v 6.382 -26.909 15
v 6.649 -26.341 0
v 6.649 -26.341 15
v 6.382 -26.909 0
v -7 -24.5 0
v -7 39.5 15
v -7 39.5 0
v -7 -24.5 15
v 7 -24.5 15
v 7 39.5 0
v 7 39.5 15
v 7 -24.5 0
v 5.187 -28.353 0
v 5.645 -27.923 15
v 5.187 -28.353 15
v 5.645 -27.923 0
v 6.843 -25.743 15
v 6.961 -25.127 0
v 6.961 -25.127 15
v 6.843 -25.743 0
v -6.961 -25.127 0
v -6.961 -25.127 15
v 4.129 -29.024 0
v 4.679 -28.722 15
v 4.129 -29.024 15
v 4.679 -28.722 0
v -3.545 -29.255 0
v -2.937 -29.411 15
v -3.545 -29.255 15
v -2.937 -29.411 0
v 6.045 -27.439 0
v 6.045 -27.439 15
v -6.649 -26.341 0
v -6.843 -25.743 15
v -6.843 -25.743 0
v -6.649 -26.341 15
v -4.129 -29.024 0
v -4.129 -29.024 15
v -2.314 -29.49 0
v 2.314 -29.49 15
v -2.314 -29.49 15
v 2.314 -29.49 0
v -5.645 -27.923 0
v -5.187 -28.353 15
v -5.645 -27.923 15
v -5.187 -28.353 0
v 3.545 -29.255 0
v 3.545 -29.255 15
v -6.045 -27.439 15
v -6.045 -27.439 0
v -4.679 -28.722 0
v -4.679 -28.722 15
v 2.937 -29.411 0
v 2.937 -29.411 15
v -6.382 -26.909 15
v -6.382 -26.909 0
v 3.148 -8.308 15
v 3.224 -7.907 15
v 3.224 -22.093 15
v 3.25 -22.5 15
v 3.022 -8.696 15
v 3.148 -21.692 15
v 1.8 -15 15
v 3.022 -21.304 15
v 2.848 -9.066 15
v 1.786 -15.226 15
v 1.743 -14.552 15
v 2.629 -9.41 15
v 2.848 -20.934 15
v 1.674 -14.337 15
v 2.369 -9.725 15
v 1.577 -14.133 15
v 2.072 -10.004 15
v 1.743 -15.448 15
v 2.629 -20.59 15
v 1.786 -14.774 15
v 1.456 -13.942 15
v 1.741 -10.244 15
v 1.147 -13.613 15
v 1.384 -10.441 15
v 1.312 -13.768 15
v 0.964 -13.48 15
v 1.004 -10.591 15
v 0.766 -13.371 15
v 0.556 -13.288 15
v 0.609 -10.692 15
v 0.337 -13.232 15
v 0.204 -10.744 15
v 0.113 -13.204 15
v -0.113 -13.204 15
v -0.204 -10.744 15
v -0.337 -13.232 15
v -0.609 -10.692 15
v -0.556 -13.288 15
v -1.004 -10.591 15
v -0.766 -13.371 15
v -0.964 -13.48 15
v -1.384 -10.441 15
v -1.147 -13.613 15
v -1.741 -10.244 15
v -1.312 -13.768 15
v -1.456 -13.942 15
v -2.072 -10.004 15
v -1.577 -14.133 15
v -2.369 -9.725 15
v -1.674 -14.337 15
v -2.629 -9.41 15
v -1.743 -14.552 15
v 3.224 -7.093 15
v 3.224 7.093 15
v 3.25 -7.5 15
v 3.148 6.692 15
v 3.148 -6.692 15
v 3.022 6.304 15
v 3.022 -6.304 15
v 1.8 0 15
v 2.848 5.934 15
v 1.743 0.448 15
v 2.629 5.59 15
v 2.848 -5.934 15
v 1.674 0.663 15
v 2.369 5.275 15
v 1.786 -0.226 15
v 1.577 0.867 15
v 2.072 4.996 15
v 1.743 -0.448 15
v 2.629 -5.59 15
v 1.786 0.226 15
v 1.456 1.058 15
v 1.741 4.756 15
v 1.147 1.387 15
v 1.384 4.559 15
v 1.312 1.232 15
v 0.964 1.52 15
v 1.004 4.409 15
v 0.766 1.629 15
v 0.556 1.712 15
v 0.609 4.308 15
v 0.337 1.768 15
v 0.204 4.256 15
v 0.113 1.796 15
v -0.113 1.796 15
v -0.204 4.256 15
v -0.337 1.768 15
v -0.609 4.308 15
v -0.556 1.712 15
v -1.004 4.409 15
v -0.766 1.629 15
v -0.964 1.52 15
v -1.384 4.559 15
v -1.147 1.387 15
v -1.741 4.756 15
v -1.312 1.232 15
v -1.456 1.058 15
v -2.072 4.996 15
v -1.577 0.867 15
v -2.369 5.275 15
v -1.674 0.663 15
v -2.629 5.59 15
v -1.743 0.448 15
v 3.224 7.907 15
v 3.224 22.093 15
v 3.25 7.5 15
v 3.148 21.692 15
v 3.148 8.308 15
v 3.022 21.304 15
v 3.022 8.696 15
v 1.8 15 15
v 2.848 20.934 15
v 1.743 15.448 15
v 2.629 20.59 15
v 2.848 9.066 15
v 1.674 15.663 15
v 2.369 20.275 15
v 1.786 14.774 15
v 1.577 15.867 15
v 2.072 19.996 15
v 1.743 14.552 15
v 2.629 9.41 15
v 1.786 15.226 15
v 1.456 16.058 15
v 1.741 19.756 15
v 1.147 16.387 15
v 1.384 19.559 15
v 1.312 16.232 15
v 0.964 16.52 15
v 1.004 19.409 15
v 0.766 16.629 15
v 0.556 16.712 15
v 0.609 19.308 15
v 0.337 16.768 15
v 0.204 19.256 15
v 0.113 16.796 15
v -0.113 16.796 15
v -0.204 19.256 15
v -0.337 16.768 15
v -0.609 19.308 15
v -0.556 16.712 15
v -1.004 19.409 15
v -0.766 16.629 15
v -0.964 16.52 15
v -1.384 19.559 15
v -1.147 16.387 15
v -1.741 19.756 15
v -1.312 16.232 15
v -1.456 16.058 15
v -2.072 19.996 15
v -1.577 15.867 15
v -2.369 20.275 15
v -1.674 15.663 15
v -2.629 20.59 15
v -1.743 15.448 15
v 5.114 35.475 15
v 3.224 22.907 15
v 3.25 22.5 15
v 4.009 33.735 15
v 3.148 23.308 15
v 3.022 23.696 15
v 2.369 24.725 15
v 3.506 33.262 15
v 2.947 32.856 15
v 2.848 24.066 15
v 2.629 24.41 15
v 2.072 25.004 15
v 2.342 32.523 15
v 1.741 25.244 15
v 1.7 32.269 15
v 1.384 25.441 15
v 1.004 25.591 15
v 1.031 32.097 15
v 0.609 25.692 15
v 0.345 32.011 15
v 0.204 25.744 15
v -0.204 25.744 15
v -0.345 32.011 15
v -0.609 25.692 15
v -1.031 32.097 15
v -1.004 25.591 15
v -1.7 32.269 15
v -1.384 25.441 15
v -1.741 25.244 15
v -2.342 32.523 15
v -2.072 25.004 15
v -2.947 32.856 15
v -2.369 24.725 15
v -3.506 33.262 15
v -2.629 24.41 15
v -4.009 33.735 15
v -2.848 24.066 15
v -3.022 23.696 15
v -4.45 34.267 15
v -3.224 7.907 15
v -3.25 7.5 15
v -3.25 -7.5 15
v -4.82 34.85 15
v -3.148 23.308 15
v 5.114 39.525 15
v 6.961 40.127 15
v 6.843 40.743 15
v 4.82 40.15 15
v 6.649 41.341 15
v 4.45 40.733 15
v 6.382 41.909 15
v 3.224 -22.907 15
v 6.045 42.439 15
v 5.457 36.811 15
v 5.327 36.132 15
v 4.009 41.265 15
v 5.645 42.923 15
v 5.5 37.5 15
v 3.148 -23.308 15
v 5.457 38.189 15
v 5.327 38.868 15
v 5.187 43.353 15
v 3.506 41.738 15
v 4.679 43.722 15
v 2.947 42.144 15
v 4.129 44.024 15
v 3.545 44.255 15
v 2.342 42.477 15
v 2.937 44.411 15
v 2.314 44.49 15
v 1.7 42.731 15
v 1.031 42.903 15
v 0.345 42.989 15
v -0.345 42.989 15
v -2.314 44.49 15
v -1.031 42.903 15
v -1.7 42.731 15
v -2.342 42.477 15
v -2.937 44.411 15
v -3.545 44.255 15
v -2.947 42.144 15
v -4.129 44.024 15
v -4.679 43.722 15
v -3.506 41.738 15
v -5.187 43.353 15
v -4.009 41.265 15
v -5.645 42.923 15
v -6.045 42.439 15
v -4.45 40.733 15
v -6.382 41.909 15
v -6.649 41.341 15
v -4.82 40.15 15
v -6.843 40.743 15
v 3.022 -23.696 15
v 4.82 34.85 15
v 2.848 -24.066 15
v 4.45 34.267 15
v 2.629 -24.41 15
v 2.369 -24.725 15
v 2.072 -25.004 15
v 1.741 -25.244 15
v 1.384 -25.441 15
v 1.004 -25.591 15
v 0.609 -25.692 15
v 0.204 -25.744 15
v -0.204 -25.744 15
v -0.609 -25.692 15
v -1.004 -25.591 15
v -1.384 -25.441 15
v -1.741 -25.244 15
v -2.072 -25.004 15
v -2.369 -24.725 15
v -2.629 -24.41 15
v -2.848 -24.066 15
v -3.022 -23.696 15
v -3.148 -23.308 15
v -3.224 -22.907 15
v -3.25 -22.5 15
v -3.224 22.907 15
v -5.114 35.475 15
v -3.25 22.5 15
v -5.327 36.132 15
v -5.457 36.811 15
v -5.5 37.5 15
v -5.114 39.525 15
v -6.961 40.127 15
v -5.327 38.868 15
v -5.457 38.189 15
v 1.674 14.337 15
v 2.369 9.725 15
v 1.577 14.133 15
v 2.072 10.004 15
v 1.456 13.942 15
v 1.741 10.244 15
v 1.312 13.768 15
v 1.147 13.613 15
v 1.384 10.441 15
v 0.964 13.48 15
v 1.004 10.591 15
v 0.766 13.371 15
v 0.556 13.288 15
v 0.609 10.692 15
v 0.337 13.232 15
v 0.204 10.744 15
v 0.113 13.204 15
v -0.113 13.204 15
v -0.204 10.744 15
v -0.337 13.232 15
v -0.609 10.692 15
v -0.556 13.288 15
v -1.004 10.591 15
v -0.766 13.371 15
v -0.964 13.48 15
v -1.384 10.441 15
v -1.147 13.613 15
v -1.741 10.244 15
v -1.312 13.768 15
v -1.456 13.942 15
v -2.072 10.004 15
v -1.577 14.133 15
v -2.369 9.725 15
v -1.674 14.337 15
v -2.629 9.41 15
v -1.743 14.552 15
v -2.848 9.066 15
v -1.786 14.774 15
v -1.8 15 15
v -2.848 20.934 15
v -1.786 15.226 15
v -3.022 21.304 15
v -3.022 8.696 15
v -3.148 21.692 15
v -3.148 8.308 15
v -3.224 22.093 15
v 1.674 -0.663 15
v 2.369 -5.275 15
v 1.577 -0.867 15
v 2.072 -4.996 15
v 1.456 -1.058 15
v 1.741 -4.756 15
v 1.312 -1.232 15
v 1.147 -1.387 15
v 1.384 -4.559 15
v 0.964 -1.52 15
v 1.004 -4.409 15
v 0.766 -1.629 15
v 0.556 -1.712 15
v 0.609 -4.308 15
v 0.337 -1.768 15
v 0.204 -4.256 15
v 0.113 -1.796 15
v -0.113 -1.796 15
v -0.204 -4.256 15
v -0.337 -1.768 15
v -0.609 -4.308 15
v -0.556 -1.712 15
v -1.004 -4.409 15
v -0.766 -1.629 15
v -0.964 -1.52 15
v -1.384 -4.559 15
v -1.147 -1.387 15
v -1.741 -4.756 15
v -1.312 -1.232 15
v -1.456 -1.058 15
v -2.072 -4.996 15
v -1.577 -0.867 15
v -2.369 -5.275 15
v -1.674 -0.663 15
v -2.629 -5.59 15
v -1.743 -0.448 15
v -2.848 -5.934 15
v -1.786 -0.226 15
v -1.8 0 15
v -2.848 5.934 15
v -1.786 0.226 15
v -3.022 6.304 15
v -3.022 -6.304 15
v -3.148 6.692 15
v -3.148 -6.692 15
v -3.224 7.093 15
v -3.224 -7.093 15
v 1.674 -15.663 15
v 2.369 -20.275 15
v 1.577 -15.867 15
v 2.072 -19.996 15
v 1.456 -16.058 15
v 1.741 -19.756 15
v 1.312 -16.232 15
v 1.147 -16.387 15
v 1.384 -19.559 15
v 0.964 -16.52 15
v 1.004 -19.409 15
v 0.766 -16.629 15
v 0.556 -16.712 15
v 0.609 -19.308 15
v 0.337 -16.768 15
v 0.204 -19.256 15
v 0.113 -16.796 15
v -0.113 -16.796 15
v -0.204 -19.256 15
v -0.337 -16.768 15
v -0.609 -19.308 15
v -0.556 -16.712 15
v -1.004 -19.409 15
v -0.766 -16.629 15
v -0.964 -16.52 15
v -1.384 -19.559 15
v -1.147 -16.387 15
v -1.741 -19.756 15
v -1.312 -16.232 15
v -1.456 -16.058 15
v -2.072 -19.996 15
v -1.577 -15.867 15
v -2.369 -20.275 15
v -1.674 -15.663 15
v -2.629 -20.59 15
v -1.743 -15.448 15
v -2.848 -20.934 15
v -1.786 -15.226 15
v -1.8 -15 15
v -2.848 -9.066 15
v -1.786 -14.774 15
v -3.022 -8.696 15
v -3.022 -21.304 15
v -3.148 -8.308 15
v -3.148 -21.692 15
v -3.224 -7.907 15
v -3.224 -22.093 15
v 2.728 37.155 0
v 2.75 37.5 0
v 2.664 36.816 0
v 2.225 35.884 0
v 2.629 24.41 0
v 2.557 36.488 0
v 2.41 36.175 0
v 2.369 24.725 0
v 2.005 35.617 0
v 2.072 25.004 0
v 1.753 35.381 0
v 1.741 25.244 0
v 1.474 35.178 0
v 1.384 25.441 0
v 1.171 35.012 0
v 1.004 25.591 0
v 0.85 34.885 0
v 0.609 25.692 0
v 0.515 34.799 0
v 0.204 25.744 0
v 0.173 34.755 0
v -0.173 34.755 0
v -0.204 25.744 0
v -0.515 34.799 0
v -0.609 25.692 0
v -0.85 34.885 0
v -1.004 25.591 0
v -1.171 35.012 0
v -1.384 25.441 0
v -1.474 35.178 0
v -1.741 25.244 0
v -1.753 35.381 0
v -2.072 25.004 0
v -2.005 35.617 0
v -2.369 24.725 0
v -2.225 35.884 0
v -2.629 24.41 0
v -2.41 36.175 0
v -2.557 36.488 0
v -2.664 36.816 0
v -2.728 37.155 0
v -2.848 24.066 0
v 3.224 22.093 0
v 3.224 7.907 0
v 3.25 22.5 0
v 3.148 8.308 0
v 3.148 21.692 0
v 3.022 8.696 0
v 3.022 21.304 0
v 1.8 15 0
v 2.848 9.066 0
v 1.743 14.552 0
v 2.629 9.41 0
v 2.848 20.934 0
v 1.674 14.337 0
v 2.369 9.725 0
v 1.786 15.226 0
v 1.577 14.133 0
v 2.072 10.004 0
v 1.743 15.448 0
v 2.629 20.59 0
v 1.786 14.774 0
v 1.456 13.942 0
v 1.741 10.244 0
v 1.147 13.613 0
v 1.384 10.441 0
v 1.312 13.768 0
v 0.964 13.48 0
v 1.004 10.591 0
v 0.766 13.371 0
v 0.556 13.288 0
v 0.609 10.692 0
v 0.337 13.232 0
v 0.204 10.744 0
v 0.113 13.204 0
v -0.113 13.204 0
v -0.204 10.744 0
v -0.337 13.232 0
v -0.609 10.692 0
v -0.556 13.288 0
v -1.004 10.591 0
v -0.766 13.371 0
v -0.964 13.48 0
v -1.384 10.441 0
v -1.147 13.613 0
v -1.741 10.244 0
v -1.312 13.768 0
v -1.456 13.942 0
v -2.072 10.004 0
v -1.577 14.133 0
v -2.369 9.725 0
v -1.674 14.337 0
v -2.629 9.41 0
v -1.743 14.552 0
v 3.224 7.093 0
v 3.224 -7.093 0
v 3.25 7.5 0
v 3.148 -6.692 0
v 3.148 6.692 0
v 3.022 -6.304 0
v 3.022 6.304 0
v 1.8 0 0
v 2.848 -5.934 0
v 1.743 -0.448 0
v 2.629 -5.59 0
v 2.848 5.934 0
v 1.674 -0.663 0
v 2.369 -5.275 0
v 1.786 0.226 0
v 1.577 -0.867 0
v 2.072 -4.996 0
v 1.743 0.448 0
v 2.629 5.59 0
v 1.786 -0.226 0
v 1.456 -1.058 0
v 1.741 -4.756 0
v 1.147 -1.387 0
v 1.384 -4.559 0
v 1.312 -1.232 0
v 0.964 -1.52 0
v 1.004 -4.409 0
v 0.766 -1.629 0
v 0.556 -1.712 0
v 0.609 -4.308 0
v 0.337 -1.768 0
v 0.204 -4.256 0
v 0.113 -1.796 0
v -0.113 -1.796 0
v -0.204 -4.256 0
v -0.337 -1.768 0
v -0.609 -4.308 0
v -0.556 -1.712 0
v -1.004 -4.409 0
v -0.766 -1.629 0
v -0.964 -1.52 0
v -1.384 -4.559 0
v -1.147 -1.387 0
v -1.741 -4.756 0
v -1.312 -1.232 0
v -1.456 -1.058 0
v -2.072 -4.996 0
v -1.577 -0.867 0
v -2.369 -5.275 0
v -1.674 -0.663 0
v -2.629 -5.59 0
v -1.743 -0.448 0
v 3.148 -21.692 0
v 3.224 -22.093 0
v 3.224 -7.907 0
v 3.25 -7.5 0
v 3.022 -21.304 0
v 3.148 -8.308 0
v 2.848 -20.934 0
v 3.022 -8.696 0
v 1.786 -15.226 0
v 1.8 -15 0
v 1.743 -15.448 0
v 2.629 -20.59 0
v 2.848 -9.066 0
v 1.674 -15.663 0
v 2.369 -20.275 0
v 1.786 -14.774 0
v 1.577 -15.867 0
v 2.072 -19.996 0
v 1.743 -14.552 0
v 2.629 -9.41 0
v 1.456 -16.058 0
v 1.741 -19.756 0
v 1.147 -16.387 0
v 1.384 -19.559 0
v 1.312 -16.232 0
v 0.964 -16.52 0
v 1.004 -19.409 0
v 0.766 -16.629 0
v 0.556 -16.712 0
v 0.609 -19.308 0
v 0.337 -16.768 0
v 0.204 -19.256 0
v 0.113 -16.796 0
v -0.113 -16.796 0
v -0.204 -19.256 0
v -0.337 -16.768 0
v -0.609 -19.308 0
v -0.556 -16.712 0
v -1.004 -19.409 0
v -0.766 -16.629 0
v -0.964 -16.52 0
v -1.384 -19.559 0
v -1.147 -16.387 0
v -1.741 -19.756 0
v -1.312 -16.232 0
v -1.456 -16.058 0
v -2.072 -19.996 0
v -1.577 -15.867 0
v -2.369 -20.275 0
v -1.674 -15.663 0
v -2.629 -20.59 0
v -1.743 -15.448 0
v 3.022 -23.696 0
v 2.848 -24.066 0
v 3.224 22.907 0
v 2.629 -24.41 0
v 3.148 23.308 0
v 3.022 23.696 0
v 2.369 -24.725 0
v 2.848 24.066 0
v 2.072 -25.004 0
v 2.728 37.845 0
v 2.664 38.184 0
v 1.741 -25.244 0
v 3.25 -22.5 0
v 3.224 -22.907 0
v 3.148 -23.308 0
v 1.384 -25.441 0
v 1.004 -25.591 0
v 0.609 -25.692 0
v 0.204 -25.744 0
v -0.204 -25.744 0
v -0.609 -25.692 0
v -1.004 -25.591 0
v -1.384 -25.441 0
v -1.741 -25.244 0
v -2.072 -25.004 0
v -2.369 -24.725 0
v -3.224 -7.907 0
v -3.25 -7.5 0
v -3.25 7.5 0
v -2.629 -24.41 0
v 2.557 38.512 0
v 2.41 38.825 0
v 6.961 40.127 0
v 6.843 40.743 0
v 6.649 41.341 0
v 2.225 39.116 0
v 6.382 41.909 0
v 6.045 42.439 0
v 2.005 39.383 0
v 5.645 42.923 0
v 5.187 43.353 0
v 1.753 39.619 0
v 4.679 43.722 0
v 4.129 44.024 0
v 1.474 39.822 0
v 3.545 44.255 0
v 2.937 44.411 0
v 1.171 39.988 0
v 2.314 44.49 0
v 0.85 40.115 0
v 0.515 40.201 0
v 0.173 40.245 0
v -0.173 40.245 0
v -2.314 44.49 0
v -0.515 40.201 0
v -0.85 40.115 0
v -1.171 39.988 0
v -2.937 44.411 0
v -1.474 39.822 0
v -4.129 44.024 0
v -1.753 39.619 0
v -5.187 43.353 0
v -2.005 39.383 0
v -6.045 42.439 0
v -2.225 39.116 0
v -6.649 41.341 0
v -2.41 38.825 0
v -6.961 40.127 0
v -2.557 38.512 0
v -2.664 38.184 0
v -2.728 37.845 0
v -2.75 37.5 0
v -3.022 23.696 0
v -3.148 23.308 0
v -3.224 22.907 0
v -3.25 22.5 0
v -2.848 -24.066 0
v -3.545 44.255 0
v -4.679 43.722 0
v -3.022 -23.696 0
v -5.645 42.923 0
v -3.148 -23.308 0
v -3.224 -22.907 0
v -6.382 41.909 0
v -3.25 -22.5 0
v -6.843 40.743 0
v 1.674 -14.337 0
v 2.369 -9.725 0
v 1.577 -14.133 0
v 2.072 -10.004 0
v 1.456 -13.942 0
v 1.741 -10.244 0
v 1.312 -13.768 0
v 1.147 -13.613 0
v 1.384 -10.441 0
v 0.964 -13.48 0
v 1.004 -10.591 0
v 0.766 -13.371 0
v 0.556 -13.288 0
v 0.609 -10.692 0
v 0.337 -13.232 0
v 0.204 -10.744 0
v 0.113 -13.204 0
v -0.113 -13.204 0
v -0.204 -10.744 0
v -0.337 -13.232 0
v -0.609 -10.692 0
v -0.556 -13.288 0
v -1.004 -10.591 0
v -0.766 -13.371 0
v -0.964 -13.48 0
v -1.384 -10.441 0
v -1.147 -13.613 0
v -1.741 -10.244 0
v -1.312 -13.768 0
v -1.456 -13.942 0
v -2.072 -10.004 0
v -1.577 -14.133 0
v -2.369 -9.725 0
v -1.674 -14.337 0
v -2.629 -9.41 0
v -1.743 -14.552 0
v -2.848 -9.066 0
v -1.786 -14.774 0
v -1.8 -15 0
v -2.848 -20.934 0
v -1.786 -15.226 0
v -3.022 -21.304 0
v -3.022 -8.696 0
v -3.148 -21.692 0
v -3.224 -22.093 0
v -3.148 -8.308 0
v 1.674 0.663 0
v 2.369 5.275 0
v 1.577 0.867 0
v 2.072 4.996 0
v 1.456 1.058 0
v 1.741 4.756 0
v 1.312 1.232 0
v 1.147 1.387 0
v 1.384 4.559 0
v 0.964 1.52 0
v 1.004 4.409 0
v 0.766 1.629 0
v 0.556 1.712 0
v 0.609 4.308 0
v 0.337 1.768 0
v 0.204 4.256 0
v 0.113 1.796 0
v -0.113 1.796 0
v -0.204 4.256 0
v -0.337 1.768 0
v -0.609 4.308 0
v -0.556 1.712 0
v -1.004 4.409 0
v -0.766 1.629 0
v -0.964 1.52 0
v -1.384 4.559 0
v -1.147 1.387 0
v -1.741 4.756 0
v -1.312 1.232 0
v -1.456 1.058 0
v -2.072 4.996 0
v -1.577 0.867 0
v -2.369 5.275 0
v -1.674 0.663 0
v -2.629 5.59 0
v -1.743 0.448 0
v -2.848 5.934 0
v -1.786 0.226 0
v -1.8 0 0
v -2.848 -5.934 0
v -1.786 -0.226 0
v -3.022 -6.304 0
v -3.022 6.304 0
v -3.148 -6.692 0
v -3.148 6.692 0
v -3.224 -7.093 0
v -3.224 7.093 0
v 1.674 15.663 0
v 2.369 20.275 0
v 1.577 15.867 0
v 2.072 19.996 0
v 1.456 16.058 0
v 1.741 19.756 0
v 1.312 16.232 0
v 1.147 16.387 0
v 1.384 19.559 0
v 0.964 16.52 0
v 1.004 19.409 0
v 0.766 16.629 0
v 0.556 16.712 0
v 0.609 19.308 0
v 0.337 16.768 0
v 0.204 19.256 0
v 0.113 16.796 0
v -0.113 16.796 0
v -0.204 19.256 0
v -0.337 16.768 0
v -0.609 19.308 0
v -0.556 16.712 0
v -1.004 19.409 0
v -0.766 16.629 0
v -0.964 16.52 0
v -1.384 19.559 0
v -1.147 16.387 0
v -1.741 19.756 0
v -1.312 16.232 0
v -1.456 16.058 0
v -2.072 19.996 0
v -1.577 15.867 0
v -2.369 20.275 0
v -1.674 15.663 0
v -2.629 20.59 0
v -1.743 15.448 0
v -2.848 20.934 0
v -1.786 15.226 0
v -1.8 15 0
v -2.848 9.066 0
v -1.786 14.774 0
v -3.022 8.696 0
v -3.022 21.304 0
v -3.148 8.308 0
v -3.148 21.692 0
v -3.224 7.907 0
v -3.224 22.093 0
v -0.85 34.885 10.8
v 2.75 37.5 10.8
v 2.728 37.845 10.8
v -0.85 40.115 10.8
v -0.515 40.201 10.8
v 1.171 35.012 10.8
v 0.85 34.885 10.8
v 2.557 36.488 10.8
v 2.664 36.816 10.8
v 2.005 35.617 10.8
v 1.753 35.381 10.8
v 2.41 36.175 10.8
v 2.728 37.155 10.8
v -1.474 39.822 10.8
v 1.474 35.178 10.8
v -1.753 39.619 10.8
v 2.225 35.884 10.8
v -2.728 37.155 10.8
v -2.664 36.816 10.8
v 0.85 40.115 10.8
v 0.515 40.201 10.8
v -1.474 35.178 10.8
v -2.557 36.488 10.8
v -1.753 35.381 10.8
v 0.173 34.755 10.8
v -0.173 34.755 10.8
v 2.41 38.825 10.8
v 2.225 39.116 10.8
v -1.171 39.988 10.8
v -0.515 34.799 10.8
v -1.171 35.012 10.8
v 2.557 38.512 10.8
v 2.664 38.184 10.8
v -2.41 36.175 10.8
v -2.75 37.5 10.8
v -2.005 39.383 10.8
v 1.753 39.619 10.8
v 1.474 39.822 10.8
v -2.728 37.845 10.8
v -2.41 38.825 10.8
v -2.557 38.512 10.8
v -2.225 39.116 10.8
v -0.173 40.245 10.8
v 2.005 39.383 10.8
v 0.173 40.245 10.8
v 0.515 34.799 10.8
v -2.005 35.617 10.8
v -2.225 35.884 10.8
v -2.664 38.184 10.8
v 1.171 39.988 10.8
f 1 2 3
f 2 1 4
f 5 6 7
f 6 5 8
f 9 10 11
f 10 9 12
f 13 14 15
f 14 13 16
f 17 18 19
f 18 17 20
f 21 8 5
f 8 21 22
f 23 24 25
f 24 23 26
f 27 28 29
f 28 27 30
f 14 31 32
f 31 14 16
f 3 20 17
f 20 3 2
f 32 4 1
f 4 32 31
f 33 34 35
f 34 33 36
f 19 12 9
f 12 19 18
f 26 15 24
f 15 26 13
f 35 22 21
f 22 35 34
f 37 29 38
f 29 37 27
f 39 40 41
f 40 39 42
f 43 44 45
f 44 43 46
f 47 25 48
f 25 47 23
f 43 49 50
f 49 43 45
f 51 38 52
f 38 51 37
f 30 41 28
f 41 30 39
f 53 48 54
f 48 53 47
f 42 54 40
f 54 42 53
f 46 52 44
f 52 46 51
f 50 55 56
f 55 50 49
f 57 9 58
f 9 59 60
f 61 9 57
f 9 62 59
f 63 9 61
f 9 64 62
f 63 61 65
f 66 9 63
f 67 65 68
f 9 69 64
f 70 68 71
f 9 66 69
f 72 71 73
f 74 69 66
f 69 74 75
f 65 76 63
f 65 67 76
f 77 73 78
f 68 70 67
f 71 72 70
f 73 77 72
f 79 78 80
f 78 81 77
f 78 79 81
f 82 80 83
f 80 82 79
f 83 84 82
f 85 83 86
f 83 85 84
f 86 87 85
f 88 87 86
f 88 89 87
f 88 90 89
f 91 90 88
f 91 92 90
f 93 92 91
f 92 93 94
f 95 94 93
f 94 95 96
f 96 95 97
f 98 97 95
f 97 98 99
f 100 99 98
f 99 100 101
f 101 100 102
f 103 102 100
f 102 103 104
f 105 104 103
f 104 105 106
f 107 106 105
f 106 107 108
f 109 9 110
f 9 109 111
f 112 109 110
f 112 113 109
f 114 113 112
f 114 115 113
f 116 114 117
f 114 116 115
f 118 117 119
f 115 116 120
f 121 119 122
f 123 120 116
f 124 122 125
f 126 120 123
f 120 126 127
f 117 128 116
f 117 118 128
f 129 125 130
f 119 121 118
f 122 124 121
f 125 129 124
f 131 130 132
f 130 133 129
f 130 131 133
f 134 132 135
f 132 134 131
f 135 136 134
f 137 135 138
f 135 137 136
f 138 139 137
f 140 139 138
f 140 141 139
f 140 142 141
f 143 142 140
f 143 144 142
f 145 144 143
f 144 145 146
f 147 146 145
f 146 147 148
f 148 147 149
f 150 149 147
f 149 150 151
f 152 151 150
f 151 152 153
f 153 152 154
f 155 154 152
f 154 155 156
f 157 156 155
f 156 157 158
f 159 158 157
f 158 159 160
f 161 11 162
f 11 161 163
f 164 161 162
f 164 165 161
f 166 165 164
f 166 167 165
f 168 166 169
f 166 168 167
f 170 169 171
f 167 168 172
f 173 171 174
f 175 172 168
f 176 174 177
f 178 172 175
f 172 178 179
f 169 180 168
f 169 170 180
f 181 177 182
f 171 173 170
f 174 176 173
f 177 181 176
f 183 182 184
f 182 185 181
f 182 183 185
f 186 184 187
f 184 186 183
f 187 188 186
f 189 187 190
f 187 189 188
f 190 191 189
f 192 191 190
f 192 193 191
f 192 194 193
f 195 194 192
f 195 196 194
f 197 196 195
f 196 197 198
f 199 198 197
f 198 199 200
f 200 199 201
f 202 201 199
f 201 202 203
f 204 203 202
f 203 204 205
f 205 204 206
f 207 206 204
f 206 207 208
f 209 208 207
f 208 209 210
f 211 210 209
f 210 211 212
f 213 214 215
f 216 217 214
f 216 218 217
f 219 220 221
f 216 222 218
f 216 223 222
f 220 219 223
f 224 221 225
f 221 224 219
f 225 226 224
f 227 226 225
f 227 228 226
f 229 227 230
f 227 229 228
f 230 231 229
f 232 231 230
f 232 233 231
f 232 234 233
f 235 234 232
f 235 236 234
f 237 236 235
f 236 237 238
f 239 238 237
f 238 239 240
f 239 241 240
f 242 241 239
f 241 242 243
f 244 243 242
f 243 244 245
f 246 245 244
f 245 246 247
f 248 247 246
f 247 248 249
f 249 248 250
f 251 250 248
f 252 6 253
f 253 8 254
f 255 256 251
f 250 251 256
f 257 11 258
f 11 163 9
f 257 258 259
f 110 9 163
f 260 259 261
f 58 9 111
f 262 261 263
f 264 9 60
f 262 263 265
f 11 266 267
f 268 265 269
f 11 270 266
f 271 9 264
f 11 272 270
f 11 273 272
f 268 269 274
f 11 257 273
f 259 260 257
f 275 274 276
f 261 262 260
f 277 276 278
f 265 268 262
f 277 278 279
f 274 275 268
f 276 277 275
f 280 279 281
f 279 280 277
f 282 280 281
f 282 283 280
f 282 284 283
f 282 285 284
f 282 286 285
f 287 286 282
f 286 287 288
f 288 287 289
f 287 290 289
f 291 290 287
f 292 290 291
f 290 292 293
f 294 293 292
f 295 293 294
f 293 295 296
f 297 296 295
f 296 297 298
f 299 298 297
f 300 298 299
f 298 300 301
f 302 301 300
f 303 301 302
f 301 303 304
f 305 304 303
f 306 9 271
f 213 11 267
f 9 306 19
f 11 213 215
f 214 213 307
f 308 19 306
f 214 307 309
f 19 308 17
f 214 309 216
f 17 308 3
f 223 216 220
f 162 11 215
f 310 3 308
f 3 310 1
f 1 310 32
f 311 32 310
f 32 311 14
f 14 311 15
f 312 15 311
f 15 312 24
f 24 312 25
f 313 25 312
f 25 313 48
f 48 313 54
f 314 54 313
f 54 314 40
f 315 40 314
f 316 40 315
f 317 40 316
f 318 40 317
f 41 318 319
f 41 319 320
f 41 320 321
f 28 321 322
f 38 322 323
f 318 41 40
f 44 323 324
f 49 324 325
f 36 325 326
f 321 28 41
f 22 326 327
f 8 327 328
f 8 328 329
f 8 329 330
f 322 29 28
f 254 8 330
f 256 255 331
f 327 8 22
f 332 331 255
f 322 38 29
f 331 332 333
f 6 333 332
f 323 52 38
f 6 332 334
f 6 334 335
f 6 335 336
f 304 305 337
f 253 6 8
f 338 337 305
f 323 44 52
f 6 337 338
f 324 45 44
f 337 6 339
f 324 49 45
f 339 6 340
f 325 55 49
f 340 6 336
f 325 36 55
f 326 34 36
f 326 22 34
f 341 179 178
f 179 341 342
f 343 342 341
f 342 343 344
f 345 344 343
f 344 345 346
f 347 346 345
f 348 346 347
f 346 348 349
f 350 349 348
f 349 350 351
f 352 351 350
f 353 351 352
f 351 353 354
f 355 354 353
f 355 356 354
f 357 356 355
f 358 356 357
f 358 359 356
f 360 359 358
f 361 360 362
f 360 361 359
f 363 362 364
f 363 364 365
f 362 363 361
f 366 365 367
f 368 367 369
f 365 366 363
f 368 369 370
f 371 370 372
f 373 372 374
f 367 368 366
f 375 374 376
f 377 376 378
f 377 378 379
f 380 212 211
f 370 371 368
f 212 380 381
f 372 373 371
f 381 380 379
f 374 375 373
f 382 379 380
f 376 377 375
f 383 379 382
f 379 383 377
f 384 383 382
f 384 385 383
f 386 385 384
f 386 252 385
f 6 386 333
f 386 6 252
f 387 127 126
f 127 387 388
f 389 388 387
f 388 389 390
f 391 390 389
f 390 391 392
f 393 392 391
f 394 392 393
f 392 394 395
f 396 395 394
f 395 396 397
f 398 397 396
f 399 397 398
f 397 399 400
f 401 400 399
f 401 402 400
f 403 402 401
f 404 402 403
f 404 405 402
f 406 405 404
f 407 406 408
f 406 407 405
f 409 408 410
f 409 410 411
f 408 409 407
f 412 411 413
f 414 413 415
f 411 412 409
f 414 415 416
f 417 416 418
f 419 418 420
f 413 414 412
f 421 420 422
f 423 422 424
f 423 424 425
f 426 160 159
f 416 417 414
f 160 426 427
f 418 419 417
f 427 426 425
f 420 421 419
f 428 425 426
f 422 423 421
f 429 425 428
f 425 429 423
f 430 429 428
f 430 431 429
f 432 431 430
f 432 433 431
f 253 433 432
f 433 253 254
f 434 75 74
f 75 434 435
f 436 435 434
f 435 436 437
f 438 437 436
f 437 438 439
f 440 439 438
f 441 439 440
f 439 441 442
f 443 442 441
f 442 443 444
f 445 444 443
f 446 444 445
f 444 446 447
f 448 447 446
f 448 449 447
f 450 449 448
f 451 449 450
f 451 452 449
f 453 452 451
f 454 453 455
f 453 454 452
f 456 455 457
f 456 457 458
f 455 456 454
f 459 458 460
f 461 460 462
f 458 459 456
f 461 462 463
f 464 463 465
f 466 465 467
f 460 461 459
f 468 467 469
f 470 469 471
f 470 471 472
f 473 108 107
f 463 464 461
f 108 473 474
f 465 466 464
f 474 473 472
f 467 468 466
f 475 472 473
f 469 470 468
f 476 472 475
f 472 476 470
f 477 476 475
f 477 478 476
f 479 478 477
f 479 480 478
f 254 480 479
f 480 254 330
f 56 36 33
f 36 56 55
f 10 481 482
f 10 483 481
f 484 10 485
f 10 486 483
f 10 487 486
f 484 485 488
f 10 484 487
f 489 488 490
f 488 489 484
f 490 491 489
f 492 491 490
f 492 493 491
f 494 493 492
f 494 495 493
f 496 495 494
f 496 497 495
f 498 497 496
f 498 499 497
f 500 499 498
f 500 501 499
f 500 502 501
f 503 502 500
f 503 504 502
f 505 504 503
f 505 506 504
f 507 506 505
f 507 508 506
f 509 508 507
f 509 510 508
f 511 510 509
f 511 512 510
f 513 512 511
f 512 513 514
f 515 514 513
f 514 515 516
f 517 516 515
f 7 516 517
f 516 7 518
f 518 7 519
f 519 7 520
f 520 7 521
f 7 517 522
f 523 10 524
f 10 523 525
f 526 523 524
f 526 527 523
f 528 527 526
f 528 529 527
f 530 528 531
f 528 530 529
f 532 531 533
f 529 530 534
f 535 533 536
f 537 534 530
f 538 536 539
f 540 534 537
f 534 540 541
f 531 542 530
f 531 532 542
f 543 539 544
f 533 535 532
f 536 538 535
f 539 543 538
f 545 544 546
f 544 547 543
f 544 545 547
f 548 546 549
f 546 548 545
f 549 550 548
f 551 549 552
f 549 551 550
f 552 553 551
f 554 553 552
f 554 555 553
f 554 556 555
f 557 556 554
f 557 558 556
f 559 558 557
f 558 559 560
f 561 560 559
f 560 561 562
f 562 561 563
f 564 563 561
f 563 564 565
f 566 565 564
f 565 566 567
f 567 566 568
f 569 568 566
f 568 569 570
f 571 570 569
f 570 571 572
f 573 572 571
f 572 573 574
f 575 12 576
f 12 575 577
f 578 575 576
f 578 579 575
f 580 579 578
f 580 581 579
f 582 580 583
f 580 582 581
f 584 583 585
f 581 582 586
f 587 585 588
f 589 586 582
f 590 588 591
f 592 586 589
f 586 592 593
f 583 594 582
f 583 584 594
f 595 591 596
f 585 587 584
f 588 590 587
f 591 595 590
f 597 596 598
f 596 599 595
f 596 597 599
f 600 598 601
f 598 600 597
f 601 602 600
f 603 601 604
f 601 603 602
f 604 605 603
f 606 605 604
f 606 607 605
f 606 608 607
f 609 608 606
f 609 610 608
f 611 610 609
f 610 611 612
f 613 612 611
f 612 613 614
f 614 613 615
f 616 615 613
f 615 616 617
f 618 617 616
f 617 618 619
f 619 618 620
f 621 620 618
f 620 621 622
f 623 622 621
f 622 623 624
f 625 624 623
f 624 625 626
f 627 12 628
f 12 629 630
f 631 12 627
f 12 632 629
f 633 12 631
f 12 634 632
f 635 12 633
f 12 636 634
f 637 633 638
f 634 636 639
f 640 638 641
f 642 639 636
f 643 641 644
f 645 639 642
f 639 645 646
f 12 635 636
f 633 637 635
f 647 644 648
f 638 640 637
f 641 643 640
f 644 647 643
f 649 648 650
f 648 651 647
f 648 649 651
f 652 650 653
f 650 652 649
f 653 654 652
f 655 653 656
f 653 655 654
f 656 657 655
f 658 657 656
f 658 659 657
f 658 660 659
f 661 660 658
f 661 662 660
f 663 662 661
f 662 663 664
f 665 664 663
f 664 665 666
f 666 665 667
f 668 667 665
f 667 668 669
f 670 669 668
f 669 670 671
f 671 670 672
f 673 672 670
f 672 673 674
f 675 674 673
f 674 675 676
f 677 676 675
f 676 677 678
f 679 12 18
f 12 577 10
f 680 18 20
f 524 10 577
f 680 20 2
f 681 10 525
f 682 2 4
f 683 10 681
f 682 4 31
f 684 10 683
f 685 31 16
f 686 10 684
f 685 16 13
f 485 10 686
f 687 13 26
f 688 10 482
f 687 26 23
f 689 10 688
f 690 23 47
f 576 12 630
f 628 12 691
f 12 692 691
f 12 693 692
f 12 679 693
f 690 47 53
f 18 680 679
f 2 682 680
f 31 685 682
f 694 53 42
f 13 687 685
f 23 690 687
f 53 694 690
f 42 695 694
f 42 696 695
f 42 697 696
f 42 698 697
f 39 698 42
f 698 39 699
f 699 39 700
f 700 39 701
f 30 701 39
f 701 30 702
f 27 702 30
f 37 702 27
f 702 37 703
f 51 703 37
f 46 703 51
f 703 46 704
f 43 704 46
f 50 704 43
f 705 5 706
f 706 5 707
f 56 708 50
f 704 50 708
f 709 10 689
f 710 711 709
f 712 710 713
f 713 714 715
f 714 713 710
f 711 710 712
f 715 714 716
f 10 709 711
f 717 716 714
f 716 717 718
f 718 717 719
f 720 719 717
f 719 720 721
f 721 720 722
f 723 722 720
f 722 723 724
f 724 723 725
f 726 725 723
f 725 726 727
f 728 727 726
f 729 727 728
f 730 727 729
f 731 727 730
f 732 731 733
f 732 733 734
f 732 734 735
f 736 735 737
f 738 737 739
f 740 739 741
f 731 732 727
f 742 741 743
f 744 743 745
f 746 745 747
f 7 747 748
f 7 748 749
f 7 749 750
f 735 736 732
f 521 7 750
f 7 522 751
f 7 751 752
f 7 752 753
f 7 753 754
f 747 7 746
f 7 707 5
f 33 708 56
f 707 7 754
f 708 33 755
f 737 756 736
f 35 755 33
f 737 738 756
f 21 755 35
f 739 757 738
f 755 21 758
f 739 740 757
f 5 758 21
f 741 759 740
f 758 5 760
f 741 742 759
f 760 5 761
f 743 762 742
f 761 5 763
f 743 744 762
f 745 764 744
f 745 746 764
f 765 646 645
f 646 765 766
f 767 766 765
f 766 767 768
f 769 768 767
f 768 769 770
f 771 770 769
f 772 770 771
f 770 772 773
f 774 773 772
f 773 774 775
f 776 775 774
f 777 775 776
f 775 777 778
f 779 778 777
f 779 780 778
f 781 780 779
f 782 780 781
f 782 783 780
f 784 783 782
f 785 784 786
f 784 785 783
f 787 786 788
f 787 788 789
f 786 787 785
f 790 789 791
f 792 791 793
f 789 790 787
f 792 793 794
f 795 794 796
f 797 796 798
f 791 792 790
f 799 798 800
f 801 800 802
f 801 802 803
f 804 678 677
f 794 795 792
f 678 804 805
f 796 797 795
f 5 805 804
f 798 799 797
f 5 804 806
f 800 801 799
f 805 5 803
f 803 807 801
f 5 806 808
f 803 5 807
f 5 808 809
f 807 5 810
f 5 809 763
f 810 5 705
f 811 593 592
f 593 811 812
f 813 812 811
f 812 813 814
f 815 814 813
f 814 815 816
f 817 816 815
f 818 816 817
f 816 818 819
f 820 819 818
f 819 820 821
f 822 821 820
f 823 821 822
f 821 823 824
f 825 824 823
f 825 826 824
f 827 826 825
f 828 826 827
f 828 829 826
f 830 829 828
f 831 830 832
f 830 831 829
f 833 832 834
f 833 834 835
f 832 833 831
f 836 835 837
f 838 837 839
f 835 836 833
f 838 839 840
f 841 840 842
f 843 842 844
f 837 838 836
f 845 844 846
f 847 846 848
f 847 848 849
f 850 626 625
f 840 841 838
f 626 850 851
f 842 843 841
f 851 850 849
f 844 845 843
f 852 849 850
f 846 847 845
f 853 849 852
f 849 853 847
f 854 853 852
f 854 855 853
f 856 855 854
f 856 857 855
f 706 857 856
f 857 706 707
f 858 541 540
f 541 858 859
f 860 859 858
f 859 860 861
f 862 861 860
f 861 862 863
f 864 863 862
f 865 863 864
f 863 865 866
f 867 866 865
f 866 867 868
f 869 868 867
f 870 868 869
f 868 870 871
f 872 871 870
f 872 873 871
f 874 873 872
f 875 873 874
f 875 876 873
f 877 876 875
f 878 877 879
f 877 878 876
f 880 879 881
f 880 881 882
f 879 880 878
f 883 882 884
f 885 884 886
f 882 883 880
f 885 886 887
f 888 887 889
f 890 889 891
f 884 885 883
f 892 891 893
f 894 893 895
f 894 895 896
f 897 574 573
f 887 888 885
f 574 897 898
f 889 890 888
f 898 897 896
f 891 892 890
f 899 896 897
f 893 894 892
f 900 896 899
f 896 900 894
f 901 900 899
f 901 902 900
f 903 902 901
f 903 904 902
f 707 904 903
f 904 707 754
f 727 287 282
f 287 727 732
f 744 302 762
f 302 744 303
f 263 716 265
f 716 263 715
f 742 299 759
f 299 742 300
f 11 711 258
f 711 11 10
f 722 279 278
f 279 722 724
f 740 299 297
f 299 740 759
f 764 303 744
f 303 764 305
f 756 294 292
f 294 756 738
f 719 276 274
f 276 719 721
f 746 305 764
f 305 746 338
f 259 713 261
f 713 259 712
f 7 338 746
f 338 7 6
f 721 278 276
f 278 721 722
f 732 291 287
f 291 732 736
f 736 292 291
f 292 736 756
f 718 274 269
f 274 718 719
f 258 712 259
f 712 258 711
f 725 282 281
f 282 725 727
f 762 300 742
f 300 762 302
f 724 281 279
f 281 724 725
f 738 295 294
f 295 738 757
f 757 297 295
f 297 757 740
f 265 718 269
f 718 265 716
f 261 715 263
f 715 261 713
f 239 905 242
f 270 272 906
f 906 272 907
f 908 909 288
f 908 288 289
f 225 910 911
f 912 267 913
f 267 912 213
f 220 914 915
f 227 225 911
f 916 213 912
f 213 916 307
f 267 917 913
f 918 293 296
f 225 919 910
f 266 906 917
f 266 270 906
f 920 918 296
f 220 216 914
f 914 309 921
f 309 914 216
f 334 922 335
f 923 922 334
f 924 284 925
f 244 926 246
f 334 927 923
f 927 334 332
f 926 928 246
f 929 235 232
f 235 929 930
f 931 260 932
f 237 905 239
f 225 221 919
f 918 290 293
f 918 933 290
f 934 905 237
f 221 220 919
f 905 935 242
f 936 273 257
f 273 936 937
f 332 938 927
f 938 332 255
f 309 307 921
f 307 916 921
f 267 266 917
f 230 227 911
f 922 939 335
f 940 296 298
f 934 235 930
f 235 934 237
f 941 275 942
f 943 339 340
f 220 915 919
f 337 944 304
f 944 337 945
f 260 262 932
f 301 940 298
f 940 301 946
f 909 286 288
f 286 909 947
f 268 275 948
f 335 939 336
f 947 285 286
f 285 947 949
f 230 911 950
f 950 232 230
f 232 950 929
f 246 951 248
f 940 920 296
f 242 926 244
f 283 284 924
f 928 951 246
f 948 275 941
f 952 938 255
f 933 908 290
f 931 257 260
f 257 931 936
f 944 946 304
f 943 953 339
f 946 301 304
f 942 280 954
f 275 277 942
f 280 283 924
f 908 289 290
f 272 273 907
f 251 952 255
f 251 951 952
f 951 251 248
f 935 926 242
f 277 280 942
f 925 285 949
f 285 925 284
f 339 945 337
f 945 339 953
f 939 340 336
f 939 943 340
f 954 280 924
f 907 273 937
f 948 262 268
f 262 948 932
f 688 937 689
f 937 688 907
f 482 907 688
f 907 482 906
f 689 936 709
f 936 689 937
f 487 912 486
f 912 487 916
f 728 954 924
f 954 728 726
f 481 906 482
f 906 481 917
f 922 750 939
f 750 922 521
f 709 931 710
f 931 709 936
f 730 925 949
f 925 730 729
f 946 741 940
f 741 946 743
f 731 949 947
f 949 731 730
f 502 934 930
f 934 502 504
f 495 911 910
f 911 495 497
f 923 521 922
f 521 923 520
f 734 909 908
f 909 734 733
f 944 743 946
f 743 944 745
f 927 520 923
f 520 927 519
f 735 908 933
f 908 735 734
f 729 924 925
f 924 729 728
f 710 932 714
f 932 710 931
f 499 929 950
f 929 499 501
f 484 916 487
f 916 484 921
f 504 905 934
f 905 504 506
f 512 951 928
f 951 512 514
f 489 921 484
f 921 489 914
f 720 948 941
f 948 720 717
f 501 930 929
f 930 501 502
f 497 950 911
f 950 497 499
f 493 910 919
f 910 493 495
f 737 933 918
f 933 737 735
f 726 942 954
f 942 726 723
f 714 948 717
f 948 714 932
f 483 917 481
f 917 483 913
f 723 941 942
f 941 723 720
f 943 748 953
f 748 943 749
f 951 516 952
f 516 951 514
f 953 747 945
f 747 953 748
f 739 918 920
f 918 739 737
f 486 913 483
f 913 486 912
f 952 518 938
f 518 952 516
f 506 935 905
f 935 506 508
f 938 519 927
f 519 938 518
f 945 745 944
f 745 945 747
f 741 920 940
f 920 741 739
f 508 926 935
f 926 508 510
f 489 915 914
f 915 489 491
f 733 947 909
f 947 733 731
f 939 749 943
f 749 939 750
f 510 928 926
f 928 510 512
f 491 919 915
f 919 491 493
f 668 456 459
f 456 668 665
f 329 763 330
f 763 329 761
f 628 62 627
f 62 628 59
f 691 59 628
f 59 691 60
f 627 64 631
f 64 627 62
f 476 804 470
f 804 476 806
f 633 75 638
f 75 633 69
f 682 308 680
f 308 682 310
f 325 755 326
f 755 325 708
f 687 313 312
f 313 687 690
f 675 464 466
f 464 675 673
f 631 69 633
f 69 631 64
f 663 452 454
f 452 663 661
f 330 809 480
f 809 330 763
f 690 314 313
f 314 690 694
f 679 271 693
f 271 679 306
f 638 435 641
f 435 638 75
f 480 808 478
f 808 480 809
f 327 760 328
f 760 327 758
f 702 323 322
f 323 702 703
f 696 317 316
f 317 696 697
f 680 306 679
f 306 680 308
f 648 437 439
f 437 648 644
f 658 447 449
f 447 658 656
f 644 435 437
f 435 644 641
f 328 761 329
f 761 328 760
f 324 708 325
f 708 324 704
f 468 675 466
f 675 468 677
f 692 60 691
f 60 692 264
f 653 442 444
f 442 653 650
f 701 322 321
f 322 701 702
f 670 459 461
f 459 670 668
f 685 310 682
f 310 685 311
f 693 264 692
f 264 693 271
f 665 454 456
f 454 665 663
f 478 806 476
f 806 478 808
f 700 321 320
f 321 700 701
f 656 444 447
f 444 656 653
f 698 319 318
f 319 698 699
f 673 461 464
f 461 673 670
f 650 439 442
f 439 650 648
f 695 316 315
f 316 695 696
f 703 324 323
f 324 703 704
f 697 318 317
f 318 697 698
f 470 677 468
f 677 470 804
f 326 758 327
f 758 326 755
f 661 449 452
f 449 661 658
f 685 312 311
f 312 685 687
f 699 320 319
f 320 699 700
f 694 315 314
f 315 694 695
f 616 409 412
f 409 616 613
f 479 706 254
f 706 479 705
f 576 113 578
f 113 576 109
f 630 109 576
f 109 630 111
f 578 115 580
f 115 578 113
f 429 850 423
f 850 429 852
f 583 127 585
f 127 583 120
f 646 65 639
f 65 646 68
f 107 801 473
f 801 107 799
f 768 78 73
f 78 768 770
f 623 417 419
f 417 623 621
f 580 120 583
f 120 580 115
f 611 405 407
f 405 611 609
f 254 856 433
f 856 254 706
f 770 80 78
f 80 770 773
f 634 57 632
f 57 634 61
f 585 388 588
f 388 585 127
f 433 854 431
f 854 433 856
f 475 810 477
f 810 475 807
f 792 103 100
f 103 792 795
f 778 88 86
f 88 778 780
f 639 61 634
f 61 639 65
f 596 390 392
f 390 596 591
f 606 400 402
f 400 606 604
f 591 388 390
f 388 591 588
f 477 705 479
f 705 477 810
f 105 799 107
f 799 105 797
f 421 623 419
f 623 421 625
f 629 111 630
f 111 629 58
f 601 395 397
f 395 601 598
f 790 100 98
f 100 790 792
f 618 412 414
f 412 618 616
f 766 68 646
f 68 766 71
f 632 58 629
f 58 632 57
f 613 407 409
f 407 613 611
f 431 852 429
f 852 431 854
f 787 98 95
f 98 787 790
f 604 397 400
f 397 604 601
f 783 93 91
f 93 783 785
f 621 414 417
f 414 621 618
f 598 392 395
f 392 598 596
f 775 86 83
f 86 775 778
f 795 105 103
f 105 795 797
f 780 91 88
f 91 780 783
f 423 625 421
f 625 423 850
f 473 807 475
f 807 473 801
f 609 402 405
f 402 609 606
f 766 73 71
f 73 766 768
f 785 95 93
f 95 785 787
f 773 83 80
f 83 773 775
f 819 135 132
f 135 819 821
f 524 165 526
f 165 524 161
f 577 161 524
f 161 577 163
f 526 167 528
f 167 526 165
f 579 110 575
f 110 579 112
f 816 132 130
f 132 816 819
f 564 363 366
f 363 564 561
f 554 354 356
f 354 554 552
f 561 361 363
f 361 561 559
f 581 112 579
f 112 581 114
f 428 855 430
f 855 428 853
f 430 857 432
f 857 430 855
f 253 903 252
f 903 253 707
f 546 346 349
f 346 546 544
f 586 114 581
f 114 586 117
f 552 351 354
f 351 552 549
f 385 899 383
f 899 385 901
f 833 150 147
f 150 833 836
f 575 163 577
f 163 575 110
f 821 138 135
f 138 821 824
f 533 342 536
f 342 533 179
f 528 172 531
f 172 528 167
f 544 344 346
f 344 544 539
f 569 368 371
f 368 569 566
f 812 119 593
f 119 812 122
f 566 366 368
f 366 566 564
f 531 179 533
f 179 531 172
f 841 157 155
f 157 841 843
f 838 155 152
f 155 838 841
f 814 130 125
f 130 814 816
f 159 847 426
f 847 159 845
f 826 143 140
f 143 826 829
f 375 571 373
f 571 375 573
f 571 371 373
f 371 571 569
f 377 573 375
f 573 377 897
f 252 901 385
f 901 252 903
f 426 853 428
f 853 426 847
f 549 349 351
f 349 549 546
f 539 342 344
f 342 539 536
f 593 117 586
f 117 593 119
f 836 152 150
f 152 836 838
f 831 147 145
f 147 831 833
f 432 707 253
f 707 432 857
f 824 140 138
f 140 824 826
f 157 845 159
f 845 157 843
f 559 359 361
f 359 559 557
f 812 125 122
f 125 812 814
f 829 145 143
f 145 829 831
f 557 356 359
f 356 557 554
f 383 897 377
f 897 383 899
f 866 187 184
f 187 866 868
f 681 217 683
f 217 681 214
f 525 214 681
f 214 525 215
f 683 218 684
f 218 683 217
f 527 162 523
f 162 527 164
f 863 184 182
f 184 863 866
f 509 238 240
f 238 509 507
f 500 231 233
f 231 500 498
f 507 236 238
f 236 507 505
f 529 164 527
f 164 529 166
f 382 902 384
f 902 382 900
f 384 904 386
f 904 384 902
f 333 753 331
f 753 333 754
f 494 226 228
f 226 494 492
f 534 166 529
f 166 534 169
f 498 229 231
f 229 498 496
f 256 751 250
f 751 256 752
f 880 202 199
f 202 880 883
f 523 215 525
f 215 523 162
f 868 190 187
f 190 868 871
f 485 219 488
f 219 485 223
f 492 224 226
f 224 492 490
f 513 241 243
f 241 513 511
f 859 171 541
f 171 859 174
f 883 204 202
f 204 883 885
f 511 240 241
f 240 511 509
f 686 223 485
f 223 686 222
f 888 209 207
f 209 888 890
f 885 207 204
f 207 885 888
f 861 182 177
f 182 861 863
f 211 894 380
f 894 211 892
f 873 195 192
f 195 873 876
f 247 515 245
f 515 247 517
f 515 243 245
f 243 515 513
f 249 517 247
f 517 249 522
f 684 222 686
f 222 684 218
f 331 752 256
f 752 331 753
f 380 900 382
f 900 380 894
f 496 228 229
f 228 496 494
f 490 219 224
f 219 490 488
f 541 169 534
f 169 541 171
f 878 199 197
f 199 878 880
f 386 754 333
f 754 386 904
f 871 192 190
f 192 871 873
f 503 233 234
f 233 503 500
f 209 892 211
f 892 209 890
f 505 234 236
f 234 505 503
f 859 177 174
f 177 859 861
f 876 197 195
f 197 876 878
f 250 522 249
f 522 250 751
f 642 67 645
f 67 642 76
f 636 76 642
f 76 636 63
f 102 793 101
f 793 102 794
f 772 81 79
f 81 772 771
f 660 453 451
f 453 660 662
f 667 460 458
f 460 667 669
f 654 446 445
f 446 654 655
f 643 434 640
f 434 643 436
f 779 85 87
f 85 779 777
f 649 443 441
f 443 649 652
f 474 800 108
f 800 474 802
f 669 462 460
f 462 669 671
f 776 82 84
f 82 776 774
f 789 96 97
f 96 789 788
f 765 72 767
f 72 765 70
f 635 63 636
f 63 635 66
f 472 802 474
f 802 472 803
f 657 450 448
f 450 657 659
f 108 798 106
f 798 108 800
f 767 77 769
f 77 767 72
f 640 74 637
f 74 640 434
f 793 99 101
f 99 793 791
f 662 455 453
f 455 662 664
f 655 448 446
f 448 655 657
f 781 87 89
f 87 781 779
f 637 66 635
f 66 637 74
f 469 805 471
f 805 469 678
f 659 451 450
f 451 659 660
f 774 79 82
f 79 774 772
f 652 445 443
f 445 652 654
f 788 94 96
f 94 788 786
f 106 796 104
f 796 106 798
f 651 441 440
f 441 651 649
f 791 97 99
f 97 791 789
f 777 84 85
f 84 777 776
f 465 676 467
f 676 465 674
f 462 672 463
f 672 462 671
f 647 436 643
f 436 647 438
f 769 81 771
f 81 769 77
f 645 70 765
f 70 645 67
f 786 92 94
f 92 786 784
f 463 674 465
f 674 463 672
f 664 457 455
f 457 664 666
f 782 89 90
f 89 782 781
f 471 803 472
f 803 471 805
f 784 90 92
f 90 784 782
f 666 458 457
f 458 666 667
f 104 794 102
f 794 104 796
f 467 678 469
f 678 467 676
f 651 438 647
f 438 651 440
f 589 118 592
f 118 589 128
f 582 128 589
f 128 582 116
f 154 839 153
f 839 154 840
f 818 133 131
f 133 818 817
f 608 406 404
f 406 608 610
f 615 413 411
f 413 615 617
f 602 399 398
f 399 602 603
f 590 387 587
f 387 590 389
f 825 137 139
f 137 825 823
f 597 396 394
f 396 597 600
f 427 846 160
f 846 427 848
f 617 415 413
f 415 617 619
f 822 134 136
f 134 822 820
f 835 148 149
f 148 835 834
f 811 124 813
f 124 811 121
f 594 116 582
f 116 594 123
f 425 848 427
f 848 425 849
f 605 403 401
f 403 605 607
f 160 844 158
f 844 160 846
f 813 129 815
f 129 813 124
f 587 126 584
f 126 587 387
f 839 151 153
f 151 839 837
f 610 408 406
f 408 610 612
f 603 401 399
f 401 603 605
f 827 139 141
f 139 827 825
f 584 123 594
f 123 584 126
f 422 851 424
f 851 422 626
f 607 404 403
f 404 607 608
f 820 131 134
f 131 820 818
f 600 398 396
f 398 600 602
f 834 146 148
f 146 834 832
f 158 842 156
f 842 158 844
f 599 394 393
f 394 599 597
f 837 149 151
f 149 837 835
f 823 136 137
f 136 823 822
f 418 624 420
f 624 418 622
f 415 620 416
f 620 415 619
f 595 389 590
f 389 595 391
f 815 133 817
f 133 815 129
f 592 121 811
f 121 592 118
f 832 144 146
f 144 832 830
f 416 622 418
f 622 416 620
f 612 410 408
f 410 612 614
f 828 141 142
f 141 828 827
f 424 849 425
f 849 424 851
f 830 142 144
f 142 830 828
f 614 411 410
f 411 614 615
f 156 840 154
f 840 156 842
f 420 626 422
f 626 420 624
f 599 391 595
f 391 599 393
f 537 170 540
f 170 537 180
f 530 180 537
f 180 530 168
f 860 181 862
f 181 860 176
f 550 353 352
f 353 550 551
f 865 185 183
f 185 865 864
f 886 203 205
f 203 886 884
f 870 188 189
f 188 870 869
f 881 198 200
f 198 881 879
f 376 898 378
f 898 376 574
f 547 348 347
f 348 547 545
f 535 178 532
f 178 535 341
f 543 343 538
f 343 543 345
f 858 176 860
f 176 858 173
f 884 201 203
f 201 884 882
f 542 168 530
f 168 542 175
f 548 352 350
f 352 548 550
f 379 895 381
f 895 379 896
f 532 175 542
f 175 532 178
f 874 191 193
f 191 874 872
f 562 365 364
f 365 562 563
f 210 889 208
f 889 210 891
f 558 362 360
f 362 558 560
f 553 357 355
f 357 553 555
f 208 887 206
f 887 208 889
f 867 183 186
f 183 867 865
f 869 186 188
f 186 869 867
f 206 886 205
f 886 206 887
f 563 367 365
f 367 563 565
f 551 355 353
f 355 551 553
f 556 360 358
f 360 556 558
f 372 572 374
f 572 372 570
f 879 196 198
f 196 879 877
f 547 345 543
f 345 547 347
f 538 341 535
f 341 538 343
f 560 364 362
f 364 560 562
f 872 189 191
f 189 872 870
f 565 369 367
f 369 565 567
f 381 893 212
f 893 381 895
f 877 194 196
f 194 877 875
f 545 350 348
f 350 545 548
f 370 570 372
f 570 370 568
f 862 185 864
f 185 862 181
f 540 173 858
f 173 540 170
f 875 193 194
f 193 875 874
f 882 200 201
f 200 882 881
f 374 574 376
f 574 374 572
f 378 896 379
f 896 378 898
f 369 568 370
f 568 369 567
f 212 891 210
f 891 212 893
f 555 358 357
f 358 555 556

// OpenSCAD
$fn = 50;


difference() {
	union() {
		hull() {
			translate(v = [-2.0000000000, 24.5000000000, 0]) {
				cylinder(h = 15, r = 5);
			}
			translate(v = [2.0000000000, 24.5000000000, 0]) {
				cylinder(h = 15, r = 5);
			}
			translate(v = [-2.0000000000, -24.5000000000, 0]) {
				cylinder(h = 15, r = 5);
			}
			translate(v = [2.0000000000, -24.5000000000, 0]) {
				cylinder(h = 15, r = 5);
			}
		}
		translate(v = [0.0000000000, 30.0000000000, 0]) {
			hull() {
				translate(v = [-2.0000000000, 9.5000000000, 0]) {
					cylinder(h = 15, r = 5);
				}
				translate(v = [2.0000000000, 9.5000000000, 0]) {
					cylinder(h = 15, r = 5);
				}
				translate(v = [-2.0000000000, -9.5000000000, 0]) {
					cylinder(h = 15, r = 5);
				}
				translate(v = [2.0000000000, -9.5000000000, 0]) {
					cylinder(h = 15, r = 5);
				}
			}
		}
		translate(v = [0.0000000000, 30.0000000000, 0]) {
			hull() {
				translate(v = [-2.0000000000, 9.5000000000, 0]) {
					cylinder(h = 15, r = 5);
				}
				translate(v = [2.0000000000, 9.5000000000, 0]) {
					cylinder(h = 15, r = 5);
				}
				translate(v = [-2.0000000000, -9.5000000000, 0]) {
					cylinder(h = 15, r = 5);
				}
				translate(v = [2.0000000000, -9.5000000000, 0]) {
					cylinder(h = 15, r = 5);
				}
			}
		}
	}
	union() {
		translate(v = [0.0000000000, 37.5000000000, 15]) {
			rotate(a = [0, 0, 0]) {
				difference() {
					union() {
						#translate(v = [0, 0, -15.0000000000]) {
							cylinder(h = 15, r = 2.2500000000);
						}
						#translate(v = [0, 0, -4.2000000000]) {
							cylinder(h = 4.2000000000, r1 = 2.7500000000, r2 = 5.5000000000);
						}
						#translate(v = [0, 0, -15.0000000000]) {
							cylinder(h = 15, r = 2.7500000000);
						}
						#translate(v = [0, 0, -15.0000000000]) {
							cylinder(h = 15, r = 2.2500000000);
						}
					}
					union();
				}
			}
		}
		translate(v = [0.0000000000, 37.5000000000, 15]) {
			rotate(a = [0, 0, 0]) {
				difference() {
					union() {
						#translate(v = [0, 0, -15.0000000000]) {
							cylinder(h = 15, r = 2.2500000000);
						}
						#translate(v = [0, 0, -4.2000000000]) {
							cylinder(h = 4.2000000000, r1 = 2.7500000000, r2 = 5.5000000000);
						}
						#translate(v = [0, 0, -15.0000000000]) {
							cylinder(h = 15, r = 2.7500000000);
						}
						#translate(v = [0, 0, -15.0000000000]) {
							cylinder(h = 15, r = 2.2500000000);
						}
					}
					union();
				}
			}
		}
		translate(v = [0.0000000000, -22.5000000000, 0]) {
			translate(v = [0, 0, -100]) {
				cylinder(h = 200, r = 3.2500000000);
			}
		}
		translate(v = [0.0000000000, -7.5000000000, 0]) {
			translate(v = [0, 0, -100]) {
				cylinder(h = 200, r = 3.2500000000);
			}
		}
		translate(v = [0.0000000000, 7.5000000000, 0]) {
			translate(v = [0, 0, -100]) {
				cylinder(h = 200, r = 3.2500000000);
			}
		}
		translate(v = [0.0000000000, 22.5000000000, 0]) {
			translate(v = [0, 0, -100]) {
				cylinder(h = 200, r = 3.2500000000);
			}
		}
		translate(v = [0.0000000000, -22.5000000000, 0]) {
			translate(v = [0, 0, -100]) {
				cylinder(h = 200, r = 1.8000000000);
			}
		}
		translate(v = [0.0000000000, -15.0000000000, 0]) {
			translate(v = [0, 0, -100]) {
				cylinder(h = 200, r = 1.8000000000);
			}
		}
		translate(v = [0.0000000000, -7.5000000000, 0]) {
			translate(v = [0, 0, -100]) {
				cylinder(h = 200, r = 1.8000000000);
			}
		}
		translate(v = [0, 0, -100]) {
			cylinder(h = 200, r = 1.8000000000);
		}
		translate(v = [0.0000000000, 7.5000000000, 0]) {
			translate(v = [0, 0, -100]) {
				cylinder(h = 200, r = 1.8000000000);
			}
		}
		translate(v = [0.0000000000, 15.0000000000, 0]) {
			translate(v = [0, 0, -100]) {
				cylinder(h = 200, r = 1.8000000000);
			}
		}
		translate(v = [0.0000000000, 22.5000000000, 0]) {
			translate(v = [0, 0, -100]) {
				cylinder(h = 200, r = 1.8000000000);
			}
		}
	}
}
